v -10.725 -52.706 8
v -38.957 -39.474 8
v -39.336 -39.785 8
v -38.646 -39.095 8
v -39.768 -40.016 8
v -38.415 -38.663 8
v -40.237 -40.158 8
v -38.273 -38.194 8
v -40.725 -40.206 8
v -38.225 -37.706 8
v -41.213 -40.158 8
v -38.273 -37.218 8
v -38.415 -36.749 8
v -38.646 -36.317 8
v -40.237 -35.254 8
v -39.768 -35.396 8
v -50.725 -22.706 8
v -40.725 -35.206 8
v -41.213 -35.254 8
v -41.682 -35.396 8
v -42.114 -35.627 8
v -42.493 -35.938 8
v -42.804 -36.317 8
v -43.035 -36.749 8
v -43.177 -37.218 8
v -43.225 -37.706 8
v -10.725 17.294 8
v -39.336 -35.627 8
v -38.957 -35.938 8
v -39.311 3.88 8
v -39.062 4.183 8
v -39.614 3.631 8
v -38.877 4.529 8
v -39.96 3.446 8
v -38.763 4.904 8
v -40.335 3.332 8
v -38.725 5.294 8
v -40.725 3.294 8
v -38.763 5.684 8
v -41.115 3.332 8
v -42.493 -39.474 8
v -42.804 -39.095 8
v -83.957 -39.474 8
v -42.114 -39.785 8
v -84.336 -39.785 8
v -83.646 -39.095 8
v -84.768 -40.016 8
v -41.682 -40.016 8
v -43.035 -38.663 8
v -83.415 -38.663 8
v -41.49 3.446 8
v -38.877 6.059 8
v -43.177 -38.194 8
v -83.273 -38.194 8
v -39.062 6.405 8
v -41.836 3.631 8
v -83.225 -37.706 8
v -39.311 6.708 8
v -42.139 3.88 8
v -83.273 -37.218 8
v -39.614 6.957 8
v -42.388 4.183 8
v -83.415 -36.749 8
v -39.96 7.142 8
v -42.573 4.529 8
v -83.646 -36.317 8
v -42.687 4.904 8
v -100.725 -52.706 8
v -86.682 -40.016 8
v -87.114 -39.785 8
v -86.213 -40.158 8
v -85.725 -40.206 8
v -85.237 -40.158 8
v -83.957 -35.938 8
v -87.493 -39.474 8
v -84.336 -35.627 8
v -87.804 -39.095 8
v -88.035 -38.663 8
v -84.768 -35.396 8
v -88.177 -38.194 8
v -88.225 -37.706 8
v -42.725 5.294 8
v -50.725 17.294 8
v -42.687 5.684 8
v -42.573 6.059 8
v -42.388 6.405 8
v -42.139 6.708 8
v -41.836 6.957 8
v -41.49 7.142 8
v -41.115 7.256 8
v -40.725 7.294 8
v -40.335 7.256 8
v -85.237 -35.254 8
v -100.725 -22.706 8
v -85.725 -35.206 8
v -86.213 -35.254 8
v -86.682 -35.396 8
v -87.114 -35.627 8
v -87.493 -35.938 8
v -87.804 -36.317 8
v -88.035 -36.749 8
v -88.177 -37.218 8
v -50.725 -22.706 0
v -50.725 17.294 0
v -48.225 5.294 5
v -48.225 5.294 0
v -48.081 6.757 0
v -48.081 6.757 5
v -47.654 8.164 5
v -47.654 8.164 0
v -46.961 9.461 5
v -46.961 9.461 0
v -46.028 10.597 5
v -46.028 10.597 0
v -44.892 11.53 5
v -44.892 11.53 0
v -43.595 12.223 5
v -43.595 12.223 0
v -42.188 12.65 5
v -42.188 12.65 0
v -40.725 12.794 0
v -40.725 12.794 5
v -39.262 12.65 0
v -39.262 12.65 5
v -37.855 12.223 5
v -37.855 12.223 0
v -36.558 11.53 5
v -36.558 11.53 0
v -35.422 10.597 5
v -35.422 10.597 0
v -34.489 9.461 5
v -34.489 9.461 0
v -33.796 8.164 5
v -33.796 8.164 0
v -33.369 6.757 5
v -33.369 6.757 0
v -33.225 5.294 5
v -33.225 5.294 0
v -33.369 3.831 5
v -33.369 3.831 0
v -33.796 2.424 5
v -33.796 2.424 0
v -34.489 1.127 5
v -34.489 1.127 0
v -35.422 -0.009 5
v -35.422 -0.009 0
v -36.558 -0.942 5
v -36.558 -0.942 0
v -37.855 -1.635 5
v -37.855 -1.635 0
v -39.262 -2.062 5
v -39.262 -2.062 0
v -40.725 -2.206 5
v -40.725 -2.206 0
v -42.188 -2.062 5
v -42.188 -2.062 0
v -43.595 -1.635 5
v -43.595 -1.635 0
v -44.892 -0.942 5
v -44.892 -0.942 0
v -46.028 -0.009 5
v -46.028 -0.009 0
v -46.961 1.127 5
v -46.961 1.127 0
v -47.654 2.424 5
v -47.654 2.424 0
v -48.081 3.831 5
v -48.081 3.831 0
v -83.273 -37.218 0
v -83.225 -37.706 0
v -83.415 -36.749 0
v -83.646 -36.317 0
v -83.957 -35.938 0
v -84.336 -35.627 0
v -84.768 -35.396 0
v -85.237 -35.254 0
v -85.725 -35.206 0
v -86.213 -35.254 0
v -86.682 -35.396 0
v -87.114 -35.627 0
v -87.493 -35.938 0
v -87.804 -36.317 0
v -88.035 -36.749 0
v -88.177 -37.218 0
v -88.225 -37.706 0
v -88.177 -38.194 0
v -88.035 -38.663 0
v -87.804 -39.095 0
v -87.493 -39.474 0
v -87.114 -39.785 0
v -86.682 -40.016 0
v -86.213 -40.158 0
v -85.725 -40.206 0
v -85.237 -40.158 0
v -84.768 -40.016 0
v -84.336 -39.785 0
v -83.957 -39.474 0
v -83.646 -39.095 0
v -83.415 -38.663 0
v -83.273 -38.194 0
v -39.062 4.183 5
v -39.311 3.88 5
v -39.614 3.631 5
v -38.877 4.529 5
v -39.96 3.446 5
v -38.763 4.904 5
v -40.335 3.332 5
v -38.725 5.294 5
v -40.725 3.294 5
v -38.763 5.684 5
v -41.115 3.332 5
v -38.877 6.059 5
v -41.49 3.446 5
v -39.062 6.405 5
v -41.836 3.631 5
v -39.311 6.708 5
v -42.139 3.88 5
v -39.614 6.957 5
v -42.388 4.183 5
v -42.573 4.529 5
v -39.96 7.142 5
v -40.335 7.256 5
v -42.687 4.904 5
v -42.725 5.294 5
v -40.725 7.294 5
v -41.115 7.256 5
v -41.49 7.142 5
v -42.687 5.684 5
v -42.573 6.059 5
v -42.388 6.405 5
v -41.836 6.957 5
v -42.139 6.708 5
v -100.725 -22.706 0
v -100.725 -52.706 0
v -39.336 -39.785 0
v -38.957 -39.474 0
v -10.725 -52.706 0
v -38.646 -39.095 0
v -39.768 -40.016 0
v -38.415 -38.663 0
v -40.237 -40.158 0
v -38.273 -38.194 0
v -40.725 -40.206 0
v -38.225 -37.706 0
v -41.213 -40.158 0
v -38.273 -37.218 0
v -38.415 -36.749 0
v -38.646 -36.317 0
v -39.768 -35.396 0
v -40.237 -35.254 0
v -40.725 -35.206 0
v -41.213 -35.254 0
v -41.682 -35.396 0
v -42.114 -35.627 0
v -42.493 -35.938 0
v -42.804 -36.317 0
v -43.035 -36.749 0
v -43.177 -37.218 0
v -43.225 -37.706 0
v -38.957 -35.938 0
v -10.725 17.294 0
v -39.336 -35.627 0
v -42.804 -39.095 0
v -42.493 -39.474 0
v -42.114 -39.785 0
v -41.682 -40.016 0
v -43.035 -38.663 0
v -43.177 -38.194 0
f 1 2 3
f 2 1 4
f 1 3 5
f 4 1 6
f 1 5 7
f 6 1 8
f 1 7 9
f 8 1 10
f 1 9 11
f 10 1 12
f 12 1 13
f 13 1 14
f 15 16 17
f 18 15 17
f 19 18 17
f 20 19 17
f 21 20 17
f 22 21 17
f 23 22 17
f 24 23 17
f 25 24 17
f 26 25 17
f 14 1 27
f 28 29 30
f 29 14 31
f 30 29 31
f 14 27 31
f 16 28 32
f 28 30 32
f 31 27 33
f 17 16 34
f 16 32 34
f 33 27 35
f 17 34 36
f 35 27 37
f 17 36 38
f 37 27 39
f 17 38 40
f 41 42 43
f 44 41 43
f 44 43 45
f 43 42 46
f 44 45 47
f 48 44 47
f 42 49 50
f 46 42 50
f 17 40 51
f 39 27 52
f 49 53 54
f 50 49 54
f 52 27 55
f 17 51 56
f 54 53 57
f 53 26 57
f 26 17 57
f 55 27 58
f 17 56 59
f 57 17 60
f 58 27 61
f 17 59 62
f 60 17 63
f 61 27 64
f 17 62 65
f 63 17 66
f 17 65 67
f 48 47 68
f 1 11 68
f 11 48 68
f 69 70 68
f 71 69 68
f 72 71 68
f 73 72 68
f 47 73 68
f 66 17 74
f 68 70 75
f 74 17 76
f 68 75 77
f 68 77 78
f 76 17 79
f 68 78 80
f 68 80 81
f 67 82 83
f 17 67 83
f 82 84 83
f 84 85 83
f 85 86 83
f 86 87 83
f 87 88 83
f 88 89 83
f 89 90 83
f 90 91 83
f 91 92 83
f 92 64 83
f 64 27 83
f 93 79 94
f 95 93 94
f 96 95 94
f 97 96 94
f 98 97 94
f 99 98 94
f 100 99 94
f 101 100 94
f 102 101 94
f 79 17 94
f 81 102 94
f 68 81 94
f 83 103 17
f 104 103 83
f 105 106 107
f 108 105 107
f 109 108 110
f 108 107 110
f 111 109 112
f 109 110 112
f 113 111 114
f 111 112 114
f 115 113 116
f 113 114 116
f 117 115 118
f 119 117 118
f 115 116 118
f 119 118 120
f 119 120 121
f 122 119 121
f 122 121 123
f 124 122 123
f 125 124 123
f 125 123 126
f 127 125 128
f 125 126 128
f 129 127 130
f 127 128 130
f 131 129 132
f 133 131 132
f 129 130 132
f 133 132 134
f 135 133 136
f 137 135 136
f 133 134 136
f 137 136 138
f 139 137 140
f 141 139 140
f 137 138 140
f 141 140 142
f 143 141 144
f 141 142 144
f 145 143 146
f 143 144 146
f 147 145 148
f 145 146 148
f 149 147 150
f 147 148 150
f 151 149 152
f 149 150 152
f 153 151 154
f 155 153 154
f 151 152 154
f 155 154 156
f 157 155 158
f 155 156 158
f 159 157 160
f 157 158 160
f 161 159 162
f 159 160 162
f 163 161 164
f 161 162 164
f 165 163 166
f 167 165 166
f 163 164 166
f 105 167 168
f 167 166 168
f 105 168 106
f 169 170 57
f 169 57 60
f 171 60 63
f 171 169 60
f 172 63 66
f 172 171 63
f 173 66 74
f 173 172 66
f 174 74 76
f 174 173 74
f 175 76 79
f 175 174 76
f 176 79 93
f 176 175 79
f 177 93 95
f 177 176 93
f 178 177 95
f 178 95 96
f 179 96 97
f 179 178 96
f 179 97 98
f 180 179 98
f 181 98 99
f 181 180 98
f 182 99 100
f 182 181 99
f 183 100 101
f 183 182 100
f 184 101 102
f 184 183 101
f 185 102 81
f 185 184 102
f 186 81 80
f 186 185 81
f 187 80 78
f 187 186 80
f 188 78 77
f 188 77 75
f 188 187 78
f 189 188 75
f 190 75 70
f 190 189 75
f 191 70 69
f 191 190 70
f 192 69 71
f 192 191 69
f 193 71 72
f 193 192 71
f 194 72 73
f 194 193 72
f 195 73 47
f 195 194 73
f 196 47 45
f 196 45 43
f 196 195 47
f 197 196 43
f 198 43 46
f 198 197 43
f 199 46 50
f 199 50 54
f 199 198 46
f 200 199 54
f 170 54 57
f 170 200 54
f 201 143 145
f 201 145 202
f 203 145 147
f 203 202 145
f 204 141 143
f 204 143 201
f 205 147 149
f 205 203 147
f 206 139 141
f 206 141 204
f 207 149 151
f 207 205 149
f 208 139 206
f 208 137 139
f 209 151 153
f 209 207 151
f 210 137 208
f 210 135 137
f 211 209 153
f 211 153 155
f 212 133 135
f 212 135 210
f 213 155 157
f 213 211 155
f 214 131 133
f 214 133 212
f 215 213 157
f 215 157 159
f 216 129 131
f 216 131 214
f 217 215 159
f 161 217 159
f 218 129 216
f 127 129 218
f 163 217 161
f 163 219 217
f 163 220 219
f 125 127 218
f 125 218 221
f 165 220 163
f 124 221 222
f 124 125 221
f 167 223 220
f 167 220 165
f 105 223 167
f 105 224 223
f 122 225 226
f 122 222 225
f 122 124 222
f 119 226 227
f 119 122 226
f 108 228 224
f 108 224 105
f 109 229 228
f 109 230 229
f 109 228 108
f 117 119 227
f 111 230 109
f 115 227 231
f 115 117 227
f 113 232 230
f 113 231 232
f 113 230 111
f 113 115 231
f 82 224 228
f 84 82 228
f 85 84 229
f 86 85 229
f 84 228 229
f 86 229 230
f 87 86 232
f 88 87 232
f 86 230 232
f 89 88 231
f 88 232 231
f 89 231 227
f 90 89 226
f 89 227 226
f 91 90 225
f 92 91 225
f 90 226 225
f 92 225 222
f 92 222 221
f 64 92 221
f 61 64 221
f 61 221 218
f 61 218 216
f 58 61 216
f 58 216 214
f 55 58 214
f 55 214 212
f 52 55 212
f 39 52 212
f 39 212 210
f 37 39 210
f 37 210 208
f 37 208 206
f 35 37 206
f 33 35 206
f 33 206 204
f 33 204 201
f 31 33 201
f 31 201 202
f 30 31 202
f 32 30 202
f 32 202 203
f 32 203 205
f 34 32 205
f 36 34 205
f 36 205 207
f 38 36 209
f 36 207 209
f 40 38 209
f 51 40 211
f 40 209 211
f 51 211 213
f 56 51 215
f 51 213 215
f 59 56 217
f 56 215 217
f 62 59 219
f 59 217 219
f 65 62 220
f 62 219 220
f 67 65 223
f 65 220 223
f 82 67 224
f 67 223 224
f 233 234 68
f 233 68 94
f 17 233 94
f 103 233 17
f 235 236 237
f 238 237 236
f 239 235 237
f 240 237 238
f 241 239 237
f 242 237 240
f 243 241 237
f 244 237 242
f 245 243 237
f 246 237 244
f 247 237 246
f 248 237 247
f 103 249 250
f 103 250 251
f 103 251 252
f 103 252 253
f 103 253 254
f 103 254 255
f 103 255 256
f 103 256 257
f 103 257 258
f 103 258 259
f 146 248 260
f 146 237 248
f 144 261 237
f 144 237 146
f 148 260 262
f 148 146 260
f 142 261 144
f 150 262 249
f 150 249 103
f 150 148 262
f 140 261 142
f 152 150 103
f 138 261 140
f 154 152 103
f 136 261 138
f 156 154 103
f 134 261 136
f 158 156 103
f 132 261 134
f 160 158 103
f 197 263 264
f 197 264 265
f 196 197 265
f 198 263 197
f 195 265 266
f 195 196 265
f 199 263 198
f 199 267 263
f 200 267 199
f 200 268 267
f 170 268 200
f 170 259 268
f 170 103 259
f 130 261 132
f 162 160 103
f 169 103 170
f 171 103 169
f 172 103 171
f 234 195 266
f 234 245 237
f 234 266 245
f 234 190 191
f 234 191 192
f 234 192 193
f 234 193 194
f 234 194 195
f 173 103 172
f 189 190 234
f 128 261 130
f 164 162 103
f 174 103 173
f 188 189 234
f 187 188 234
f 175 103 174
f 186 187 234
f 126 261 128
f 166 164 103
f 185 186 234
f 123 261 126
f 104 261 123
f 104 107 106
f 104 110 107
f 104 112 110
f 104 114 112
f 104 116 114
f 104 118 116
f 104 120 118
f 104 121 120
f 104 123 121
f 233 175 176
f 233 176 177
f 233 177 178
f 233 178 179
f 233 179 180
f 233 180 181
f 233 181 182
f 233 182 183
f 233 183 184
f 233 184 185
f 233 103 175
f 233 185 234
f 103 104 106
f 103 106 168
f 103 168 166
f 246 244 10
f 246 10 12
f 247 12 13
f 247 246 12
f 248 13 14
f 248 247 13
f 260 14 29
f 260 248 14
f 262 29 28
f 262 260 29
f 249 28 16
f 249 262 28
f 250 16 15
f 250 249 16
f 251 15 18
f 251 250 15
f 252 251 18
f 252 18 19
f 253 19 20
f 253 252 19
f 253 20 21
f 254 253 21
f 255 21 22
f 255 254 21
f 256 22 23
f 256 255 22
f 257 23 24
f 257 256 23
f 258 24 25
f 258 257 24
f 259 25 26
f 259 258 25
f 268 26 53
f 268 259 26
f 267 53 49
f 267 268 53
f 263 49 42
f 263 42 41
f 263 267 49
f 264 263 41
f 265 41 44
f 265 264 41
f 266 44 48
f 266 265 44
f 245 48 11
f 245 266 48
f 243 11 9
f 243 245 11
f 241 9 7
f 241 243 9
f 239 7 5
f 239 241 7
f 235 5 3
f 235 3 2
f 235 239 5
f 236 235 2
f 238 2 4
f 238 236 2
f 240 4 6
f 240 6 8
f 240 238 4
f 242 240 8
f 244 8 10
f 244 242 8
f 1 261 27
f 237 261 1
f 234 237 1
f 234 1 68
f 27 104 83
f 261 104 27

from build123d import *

# Parameters (mm, degrees)
SKETCH1_R           = 2.5
BOSS_EXTRUDE1_DEPTH = 8
SKETCH2_R           = 7.5
CUT_EXTRUDE1_DEPTH  = 5
SKETCH3_R           = 2
CUT_EXTRUDE2_DEPTH  = 114.791165634


with BuildPart() as part:
    # Sketch1 → Boss-Extrude1 (new body)
    with BuildSketch(Plane.XY):
        Polygon((-50.724939449, 17.294061535), (-10.724939449, 17.294061535), (-10.724939449, -52.705938465), (-100.724939449, -52.705938465), (-100.724939449, -22.705938465), (-50.724939449, -22.705938465), align=None)
        with Locations((-85.724939449, -37.705938465)):
            Circle(SKETCH1_R, mode=Mode.SUBTRACT)
        with Locations((-40.724939449, -37.705938465)):
            Circle(SKETCH1_R, mode=Mode.SUBTRACT)
    extrude(amount=BOSS_EXTRUDE1_DEPTH)

    # Sketch2 → Cut-Extrude1 (cut)
    with BuildSketch(Plane(origin=(0, 0, 0), x_dir=(-1, 0, 0), z_dir=(0, 0, -1))):
        with Locations((40.724939449, 5.294061535)):
            Circle(SKETCH2_R)
    extrude(amount=-CUT_EXTRUDE1_DEPTH, mode=Mode.SUBTRACT)

    # Sketch3 → Cut-Extrude2 (cut, through all)
    with BuildSketch(Plane(origin=(0, 0, 5), x_dir=(-1, 0, 0), z_dir=(0, 0, -1))):
        with Locations((40.724939449, 5.294061535)):
            Circle(SKETCH3_R)
    extrude(amount=-CUT_EXTRUDE2_DEPTH, mode=Mode.SUBTRACT)


solid = part.part
